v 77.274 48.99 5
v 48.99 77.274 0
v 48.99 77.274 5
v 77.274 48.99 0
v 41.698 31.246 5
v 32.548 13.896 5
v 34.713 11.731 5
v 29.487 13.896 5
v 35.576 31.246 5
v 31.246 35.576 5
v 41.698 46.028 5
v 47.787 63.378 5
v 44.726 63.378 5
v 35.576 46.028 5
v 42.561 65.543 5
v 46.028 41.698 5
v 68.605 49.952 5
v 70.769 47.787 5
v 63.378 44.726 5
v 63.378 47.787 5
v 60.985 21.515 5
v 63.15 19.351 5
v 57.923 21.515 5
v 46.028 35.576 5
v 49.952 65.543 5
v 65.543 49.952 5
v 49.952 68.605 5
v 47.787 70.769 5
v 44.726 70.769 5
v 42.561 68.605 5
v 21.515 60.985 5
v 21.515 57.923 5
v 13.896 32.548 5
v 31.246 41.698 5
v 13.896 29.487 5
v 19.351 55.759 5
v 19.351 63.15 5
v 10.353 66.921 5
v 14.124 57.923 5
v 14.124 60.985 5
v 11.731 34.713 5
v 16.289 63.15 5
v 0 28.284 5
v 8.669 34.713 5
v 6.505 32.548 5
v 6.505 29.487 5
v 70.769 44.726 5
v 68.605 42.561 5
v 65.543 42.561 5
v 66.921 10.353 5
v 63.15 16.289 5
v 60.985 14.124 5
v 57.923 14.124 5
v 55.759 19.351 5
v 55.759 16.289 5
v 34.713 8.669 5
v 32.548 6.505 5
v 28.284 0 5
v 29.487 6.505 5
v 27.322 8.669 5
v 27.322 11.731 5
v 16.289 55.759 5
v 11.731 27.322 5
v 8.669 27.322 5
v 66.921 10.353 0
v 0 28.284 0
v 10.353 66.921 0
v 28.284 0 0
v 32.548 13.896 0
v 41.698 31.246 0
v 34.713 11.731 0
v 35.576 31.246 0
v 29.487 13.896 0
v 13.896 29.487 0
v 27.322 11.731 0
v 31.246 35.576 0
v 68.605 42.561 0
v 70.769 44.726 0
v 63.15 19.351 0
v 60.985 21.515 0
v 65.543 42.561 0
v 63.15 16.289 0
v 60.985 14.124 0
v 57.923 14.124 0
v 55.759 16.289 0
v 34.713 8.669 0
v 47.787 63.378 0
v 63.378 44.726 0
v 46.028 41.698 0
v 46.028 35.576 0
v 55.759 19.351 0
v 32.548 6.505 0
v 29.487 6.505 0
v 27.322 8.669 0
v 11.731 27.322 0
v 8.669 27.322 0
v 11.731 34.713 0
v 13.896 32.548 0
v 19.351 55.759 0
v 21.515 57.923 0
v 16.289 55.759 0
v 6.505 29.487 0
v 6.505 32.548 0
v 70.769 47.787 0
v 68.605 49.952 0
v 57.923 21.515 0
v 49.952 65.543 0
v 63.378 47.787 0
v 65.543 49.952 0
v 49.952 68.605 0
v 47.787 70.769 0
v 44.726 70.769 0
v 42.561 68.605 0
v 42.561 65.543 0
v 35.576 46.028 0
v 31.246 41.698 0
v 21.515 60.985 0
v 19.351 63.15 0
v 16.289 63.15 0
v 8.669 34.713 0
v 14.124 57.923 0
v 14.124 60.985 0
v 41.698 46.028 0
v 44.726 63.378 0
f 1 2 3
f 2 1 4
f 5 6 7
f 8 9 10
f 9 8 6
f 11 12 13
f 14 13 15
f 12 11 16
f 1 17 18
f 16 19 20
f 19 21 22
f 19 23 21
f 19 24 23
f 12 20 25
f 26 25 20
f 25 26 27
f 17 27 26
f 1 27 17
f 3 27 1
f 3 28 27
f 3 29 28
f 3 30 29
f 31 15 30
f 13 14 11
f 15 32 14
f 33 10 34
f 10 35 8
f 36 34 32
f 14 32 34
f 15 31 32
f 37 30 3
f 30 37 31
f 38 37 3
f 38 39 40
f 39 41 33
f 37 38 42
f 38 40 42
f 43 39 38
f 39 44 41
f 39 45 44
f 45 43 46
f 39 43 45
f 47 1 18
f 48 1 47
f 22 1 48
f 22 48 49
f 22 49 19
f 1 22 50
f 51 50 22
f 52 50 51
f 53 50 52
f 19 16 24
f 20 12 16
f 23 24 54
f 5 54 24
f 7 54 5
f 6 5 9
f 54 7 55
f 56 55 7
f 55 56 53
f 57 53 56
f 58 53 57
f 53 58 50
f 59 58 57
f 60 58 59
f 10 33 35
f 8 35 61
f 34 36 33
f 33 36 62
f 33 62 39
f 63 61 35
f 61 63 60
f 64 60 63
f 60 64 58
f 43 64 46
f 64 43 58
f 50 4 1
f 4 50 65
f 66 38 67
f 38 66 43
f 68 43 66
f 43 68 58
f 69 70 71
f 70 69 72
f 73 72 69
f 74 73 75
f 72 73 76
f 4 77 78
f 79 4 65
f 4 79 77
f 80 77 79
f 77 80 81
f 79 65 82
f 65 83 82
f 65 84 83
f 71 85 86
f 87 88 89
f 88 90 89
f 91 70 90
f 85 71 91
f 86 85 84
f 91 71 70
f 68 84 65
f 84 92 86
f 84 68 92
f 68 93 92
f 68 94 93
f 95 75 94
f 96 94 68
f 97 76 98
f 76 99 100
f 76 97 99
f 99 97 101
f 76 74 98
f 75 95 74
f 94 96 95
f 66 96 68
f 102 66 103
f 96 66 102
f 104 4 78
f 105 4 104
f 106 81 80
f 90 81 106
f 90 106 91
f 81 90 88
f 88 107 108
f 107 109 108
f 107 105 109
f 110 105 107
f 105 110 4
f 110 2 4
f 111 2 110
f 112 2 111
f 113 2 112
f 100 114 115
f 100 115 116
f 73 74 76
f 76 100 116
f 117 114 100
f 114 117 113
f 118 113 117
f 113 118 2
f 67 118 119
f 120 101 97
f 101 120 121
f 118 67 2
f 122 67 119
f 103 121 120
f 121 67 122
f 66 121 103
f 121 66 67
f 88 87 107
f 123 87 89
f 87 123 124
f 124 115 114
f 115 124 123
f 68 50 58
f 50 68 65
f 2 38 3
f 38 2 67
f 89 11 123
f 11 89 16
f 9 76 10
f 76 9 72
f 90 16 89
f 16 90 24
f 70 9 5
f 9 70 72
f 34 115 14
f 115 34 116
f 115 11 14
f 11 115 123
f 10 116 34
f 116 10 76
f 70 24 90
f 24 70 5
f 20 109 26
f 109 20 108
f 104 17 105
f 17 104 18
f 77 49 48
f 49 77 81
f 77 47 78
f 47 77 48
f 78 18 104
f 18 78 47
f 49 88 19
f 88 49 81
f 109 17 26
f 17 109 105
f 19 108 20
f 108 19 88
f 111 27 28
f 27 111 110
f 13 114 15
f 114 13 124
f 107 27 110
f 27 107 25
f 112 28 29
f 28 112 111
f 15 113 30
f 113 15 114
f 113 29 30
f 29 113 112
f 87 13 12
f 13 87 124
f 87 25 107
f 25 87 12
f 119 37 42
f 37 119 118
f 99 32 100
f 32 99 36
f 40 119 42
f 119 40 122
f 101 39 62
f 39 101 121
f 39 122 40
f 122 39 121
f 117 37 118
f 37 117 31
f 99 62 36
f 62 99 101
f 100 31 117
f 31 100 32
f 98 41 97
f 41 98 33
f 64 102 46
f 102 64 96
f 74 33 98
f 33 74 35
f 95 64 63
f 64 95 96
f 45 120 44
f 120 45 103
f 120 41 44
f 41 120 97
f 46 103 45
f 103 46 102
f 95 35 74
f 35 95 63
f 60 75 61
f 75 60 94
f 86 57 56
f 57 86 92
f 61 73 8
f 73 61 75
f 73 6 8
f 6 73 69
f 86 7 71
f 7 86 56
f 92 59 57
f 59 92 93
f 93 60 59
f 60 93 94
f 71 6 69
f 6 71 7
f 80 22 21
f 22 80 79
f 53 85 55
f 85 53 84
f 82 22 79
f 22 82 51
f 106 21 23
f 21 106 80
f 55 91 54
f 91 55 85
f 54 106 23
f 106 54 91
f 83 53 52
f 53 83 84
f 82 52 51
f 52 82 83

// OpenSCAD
$fn = 32;

// ----------------------------------------------------------------------
// Polygon plate: 6-gon R40, 6 bolt windows
// ----------------------------------------------------------------------

// --- parameters (mm) ---
sides = 6;                // number of polygon sides
plate_r = 40;             // circumscribed radius of the polygon
bore_r = 8;               // centre bore radius
bolts = 6;                // number of bolt windows
ring_r = 29.44;           // bolt-circle radius
bolt_r = 4;               // bolt window radius
plate_t = 5;              // plate thickness, Z (extrusion height)

plate_d = 2 * plate_r;  // circumscribed diameter
bore_d = 2 * bore_r;  // centre bore diameter
bolt_d = 2 * bolt_r;  // bolt window diameter
ring_d = 2 * ring_r;  // bolt-circle diameter

profile = [[77.274, 48.99], [48.99, 77.274], [10.353, 66.921], [0, 28.284], [28.284, 0], [66.921, 10.353]];  // primary outline, 6 points, counter clockwise
void_1 = [[46.028, 41.698], [41.698, 46.028], [35.576, 46.028], [31.246, 41.698], [31.246, 35.576], [35.576, 31.246], [41.698, 31.246], [46.028, 35.576]];  // centre bore, 8 points
void_2 = [[70.769, 47.787], [68.605, 49.952], [65.543, 49.952], [63.378, 47.787], [63.378, 44.726], [65.543, 42.561], [68.605, 42.561], [70.769, 44.726]];  // bolt window 1, 8 points
void_3 = [[49.952, 68.605], [47.787, 70.769], [44.726, 70.769], [42.561, 68.605], [42.561, 65.543], [44.726, 63.378], [47.787, 63.378], [49.952, 65.543]];  // bolt window 2, 8 points
void_4 = [[21.515, 60.985], [19.351, 63.15], [16.289, 63.15], [14.124, 60.985], [14.124, 57.923], [16.289, 55.759], [19.351, 55.759], [21.515, 57.923]];  // bolt window 3, 8 points
void_5 = [[13.896, 32.548], [11.731, 34.713], [8.669, 34.713], [6.505, 32.548], [6.505, 29.487], [8.669, 27.322], [11.731, 27.322], [13.896, 29.487]];  // bolt window 4, 8 points
void_6 = [[34.713, 11.731], [32.548, 13.896], [29.487, 13.896], [27.322, 11.731], [27.322, 8.669], [29.487, 6.505], [32.548, 6.505], [34.713, 8.669]];  // bolt window 5, 8 points
void_7 = [[63.15, 19.351], [60.985, 21.515], [57.923, 21.515], [55.759, 19.351], [55.759, 16.289], [57.923, 14.124], [60.985, 14.124], [63.15, 16.289]];  // bolt window 6, 8 points

// --- the one profile operation ---
difference() {
  linear_extrude(height = plate_t) polygon(points = profile);
  translate([0, 0, -1])
    linear_extrude(height = plate_t + 2) polygon(points = void_1);
  translate([0, 0, -1])
    linear_extrude(height = plate_t + 2) polygon(points = void_2);
  translate([0, 0, -1])
    linear_extrude(height = plate_t + 2) polygon(points = void_3);
  translate([0, 0, -1])
    linear_extrude(height = plate_t + 2) polygon(points = void_4);
  translate([0, 0, -1])
    linear_extrude(height = plate_t + 2) polygon(points = void_5);
  translate([0, 0, -1])
    linear_extrude(height = plate_t + 2) polygon(points = void_6);
  translate([0, 0, -1])
    linear_extrude(height = plate_t + 2) polygon(points = void_7);
}
